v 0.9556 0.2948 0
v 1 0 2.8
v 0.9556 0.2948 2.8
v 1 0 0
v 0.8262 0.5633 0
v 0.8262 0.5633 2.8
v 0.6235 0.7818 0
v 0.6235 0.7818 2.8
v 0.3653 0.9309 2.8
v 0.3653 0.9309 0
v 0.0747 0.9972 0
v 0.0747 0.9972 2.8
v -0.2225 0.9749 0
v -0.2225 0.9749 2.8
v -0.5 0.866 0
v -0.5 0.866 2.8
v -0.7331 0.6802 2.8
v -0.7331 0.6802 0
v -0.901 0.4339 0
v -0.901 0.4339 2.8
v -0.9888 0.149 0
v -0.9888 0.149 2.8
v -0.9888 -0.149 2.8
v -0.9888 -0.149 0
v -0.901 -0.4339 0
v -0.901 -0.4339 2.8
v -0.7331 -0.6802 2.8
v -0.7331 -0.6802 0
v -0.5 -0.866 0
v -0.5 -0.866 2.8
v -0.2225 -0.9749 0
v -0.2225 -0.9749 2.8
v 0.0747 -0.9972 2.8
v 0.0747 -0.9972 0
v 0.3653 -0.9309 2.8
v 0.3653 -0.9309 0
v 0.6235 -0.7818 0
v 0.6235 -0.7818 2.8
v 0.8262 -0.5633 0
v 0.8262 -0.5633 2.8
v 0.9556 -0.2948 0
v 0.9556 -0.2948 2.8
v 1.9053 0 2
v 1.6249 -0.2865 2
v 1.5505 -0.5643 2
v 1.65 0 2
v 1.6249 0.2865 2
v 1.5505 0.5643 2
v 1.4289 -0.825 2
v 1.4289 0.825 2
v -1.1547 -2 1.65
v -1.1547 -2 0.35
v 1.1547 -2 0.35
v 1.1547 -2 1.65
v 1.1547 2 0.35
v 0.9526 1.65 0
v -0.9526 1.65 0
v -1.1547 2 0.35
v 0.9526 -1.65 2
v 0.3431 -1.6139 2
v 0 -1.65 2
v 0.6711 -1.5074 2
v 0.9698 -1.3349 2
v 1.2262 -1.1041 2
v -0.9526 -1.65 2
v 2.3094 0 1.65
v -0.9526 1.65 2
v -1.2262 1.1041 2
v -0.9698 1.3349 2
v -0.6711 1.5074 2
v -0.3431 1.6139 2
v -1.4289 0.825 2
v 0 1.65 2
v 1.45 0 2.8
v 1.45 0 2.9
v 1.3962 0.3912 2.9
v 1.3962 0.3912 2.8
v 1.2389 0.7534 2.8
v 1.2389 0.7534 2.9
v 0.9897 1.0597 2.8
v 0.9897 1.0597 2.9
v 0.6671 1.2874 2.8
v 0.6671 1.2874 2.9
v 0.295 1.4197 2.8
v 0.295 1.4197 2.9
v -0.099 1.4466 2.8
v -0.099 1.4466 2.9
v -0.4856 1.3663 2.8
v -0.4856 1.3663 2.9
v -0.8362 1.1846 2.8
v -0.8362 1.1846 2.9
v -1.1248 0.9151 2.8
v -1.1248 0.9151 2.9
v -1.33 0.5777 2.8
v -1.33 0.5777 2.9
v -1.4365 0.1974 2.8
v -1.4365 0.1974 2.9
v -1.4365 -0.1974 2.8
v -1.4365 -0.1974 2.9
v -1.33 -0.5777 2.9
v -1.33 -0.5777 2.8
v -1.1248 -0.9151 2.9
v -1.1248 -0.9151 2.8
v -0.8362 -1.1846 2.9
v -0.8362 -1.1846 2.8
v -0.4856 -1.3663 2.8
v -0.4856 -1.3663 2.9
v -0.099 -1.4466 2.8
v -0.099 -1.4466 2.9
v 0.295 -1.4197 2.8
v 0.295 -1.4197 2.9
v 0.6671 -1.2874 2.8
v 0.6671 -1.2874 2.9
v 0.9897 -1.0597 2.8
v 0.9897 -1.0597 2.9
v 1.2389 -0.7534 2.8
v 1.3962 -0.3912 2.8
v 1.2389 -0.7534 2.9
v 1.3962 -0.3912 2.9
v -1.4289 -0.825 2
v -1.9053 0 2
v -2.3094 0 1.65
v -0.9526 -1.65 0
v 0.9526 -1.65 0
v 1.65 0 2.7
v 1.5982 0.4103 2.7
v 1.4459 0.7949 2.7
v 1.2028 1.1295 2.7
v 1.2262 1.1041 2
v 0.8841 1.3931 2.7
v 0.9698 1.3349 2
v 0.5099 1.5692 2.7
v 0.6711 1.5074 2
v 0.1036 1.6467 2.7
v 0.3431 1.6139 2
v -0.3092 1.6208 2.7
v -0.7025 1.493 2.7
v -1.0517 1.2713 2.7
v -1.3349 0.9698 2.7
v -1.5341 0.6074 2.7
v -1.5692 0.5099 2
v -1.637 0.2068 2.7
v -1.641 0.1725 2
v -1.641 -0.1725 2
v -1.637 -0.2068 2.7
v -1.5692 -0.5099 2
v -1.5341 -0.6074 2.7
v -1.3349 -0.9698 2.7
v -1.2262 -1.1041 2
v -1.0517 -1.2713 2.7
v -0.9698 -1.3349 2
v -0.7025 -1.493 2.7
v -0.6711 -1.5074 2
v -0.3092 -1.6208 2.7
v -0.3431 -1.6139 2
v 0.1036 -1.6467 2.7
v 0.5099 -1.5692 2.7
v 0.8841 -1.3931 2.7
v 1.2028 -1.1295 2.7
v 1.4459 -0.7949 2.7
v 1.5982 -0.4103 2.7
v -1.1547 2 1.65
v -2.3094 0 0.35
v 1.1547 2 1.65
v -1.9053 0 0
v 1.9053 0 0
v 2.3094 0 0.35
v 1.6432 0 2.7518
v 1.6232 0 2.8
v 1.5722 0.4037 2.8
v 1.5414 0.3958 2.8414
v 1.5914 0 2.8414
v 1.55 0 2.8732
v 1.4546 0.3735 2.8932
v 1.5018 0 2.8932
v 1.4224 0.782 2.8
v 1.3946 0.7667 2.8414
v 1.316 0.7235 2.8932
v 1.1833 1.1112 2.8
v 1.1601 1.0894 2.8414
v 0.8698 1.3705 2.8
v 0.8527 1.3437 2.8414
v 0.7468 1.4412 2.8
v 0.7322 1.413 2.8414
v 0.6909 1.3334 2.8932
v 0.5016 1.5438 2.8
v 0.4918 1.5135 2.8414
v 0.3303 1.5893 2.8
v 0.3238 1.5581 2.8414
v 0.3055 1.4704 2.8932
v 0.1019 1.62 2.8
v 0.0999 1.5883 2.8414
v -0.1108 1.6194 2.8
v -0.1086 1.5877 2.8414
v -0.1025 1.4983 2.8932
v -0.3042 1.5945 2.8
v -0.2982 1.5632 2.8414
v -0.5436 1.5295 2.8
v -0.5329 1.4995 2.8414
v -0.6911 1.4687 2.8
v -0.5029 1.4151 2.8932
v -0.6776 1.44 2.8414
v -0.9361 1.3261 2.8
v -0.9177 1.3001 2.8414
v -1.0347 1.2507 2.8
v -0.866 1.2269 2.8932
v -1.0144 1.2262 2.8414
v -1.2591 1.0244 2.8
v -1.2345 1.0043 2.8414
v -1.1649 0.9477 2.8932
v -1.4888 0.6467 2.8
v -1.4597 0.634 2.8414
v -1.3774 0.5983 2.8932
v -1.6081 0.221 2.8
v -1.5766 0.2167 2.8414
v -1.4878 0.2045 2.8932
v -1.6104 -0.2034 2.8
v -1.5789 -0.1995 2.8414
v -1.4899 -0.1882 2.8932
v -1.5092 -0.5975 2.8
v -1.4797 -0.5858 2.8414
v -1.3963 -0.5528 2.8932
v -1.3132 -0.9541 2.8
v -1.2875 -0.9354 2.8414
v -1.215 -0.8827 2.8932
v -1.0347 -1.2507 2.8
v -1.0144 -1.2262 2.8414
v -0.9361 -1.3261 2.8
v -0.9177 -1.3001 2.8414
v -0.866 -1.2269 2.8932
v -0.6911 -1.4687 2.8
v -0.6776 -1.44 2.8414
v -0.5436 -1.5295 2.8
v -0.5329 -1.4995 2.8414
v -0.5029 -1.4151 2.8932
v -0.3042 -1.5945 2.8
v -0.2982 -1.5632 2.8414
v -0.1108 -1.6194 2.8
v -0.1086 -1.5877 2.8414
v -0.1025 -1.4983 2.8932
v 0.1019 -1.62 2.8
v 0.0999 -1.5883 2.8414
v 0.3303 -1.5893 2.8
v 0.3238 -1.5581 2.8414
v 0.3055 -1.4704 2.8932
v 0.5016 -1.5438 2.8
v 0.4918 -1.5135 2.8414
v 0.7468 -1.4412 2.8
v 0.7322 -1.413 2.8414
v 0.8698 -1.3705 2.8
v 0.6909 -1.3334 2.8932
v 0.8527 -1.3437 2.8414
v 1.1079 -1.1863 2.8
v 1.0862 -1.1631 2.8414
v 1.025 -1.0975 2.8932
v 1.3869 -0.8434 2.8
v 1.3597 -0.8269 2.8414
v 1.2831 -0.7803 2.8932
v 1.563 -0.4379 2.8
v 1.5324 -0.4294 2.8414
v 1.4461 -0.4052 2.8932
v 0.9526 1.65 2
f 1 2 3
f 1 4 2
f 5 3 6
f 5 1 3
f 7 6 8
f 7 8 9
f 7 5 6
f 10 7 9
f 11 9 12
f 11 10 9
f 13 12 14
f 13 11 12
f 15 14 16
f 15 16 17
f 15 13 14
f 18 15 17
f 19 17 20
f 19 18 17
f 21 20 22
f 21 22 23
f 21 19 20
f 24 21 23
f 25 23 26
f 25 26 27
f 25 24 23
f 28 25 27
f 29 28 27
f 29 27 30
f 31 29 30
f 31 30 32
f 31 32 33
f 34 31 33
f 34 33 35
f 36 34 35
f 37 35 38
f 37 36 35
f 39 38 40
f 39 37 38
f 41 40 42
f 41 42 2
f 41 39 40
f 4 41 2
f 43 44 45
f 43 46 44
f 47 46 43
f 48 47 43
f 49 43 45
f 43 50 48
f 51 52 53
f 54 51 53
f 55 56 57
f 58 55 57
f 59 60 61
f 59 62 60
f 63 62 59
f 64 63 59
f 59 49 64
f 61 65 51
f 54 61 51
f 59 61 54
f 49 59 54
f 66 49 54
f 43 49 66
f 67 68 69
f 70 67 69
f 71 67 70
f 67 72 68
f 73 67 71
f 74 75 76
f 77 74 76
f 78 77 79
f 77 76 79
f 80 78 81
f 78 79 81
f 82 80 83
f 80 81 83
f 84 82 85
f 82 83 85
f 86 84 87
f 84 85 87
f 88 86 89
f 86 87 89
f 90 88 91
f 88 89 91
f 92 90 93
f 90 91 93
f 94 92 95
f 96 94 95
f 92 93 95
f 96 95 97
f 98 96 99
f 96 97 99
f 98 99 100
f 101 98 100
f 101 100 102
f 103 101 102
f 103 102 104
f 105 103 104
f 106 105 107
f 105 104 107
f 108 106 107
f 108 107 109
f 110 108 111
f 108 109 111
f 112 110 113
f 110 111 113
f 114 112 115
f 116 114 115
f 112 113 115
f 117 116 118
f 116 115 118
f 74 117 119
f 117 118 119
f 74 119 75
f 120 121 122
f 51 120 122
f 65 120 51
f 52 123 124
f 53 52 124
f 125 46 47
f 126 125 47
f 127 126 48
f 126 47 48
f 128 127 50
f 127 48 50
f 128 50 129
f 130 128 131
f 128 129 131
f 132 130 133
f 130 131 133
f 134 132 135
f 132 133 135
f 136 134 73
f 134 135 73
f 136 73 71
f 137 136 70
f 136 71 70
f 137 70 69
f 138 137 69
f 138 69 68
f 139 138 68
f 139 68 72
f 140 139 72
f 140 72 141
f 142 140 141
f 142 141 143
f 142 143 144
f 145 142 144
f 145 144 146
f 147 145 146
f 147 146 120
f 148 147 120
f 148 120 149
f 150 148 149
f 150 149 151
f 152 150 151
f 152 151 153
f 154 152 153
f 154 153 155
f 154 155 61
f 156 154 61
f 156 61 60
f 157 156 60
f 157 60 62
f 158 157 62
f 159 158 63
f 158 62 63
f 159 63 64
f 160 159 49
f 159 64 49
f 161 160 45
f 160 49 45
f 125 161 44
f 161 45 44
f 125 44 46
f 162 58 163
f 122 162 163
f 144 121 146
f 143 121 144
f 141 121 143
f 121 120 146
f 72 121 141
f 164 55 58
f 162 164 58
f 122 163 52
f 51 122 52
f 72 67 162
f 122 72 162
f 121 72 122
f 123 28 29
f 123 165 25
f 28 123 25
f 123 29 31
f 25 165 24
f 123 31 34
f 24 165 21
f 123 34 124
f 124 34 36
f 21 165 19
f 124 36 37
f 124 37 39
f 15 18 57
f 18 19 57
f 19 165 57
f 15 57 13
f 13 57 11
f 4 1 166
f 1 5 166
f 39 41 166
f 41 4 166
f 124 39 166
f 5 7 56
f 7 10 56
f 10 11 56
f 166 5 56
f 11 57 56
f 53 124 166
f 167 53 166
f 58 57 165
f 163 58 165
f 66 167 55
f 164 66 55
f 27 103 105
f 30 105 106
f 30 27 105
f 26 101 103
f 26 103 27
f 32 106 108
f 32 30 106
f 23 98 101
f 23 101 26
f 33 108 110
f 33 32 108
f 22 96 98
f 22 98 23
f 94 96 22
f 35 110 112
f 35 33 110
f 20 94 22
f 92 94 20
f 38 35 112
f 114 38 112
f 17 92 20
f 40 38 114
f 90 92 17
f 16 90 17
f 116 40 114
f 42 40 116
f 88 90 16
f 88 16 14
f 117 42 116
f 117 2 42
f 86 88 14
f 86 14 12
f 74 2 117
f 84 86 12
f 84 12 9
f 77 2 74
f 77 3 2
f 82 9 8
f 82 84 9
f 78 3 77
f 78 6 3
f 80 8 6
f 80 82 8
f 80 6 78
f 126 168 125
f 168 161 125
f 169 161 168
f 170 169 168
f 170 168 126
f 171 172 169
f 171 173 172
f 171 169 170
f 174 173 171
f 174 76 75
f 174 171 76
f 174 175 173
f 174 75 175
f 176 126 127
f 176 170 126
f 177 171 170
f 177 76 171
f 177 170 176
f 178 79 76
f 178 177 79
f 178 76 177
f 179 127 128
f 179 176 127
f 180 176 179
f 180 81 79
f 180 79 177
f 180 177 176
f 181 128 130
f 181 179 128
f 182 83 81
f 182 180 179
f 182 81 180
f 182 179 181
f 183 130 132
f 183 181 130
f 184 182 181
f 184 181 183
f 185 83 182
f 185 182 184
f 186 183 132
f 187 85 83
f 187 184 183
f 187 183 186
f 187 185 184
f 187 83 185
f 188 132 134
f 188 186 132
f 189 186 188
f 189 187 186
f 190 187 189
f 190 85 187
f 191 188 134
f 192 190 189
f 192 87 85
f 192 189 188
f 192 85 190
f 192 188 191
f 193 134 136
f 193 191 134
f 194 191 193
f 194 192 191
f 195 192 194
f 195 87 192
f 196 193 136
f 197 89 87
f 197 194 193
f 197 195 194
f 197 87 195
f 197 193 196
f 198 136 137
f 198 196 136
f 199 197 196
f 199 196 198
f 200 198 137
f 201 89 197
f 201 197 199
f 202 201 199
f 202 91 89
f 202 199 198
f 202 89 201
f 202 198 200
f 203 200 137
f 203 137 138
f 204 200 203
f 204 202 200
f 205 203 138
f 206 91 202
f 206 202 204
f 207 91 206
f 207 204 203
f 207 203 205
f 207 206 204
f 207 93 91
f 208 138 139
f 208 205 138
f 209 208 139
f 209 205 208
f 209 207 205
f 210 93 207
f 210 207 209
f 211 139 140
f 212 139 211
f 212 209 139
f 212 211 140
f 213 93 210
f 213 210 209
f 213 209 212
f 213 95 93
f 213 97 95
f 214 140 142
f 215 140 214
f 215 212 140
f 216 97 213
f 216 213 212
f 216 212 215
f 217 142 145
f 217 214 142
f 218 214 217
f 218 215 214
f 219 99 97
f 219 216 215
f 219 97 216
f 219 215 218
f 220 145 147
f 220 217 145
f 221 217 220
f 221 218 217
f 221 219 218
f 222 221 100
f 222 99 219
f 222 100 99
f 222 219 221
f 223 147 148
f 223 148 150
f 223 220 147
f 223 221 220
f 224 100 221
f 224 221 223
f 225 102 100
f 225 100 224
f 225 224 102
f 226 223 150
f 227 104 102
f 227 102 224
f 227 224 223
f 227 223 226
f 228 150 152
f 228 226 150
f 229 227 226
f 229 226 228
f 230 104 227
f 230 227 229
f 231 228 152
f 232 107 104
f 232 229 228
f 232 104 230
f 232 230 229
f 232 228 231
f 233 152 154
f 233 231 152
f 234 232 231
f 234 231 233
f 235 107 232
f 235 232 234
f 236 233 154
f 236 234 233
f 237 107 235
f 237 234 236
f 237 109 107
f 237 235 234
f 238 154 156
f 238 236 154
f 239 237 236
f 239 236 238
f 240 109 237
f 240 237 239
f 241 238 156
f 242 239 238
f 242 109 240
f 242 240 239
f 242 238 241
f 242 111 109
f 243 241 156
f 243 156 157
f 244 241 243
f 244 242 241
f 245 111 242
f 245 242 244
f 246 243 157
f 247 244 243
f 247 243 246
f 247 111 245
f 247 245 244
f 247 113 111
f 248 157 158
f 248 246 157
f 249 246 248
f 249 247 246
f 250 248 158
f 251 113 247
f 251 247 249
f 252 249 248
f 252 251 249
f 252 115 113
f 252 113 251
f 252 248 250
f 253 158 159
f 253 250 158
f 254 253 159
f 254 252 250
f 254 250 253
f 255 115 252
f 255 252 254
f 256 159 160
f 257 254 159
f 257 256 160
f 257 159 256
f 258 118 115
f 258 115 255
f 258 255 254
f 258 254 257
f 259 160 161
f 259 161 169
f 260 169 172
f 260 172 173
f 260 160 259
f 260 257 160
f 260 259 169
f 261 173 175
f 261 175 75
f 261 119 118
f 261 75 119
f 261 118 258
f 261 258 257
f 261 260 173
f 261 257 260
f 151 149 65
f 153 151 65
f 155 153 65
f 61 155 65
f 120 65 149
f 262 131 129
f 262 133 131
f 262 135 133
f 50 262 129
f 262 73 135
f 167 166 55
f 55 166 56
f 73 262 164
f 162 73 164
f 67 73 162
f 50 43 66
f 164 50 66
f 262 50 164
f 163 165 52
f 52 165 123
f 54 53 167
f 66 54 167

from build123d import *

# Parameters (mm, degrees)
SKETCH1_R           = 1
SHAPE_DEPTH         = 2
CHAMFER_2_SIZE      = 0.35
SKETCH2_R           = 1.65
SKETCH2_R_2         = 1
BOSS_EXTRUDE2_DEPTH = 0.9
FILLET1_R           = 0.2
CUT_EXTRUDE1_START  = -0.1
SKETCH3_R           = 1.45
SKETCH3_R_2         = 1
CUT_EXTRUDE1_DEPTH  = 0.1


with BuildPart() as part:
    # Sketch1 → Shape (new body)
    with BuildSketch(Plane.XY):
        Polygon((-1.154700538, -2), (1.154700538, -2), (2.309401077, 0), (1.154700538, 2), (-1.154700538, 2), (-2.309401077, 0), align=None)
        Circle(SKETCH1_R, mode=Mode.SUBTRACT)
    extrude(amount=SHAPE_DEPTH)

    # Chamfer 2
    chamfer_2_edges = [part.edges().sort_by_distance(p)[0] for p in [
        (1.732050808, -1, 0),
        (0, -2, 0),
        (-1.732050808, -1, 0),
        (-1.732050808, 1, 0),
        (0, 2, 0),
        (1.732050808, 1, 0),
        (1.732050808, 1, 2),
        (1.732050808, -1, 2),
        (0, -2, 2),
        (-1.732050808, -1, 2),
        (-1.732050808, 1, 2),
        (0, 2, 2),
    ]]
    chamfer(chamfer_2_edges, length=CHAMFER_2_SIZE)

    # Sketch2 → Boss-Extrude2 (add)
    with BuildSketch(Plane.XY.offset(2)):
        Circle(SKETCH2_R)
        Circle(SKETCH2_R_2, mode=Mode.SUBTRACT)
    extrude(amount=BOSS_EXTRUDE2_DEPTH)

    # Fillet1
    fillet1_edges = [part.edges().sort_by_distance(p)[0] for p in [
        (-1.65, 0, 2.9),
    ]]
    fillet(fillet1_edges, radius=FILLET1_R)

    # Sketch3 → Cut-Extrude1 (cut)
    with BuildSketch(Plane.XY.offset(2.9).offset(CUT_EXTRUDE1_START)):
        Circle(SKETCH3_R)
        Circle(SKETCH3_R_2, mode=Mode.SUBTRACT)
    extrude(amount=CUT_EXTRUDE1_DEPTH, mode=Mode.SUBTRACT)


solid = part.part
